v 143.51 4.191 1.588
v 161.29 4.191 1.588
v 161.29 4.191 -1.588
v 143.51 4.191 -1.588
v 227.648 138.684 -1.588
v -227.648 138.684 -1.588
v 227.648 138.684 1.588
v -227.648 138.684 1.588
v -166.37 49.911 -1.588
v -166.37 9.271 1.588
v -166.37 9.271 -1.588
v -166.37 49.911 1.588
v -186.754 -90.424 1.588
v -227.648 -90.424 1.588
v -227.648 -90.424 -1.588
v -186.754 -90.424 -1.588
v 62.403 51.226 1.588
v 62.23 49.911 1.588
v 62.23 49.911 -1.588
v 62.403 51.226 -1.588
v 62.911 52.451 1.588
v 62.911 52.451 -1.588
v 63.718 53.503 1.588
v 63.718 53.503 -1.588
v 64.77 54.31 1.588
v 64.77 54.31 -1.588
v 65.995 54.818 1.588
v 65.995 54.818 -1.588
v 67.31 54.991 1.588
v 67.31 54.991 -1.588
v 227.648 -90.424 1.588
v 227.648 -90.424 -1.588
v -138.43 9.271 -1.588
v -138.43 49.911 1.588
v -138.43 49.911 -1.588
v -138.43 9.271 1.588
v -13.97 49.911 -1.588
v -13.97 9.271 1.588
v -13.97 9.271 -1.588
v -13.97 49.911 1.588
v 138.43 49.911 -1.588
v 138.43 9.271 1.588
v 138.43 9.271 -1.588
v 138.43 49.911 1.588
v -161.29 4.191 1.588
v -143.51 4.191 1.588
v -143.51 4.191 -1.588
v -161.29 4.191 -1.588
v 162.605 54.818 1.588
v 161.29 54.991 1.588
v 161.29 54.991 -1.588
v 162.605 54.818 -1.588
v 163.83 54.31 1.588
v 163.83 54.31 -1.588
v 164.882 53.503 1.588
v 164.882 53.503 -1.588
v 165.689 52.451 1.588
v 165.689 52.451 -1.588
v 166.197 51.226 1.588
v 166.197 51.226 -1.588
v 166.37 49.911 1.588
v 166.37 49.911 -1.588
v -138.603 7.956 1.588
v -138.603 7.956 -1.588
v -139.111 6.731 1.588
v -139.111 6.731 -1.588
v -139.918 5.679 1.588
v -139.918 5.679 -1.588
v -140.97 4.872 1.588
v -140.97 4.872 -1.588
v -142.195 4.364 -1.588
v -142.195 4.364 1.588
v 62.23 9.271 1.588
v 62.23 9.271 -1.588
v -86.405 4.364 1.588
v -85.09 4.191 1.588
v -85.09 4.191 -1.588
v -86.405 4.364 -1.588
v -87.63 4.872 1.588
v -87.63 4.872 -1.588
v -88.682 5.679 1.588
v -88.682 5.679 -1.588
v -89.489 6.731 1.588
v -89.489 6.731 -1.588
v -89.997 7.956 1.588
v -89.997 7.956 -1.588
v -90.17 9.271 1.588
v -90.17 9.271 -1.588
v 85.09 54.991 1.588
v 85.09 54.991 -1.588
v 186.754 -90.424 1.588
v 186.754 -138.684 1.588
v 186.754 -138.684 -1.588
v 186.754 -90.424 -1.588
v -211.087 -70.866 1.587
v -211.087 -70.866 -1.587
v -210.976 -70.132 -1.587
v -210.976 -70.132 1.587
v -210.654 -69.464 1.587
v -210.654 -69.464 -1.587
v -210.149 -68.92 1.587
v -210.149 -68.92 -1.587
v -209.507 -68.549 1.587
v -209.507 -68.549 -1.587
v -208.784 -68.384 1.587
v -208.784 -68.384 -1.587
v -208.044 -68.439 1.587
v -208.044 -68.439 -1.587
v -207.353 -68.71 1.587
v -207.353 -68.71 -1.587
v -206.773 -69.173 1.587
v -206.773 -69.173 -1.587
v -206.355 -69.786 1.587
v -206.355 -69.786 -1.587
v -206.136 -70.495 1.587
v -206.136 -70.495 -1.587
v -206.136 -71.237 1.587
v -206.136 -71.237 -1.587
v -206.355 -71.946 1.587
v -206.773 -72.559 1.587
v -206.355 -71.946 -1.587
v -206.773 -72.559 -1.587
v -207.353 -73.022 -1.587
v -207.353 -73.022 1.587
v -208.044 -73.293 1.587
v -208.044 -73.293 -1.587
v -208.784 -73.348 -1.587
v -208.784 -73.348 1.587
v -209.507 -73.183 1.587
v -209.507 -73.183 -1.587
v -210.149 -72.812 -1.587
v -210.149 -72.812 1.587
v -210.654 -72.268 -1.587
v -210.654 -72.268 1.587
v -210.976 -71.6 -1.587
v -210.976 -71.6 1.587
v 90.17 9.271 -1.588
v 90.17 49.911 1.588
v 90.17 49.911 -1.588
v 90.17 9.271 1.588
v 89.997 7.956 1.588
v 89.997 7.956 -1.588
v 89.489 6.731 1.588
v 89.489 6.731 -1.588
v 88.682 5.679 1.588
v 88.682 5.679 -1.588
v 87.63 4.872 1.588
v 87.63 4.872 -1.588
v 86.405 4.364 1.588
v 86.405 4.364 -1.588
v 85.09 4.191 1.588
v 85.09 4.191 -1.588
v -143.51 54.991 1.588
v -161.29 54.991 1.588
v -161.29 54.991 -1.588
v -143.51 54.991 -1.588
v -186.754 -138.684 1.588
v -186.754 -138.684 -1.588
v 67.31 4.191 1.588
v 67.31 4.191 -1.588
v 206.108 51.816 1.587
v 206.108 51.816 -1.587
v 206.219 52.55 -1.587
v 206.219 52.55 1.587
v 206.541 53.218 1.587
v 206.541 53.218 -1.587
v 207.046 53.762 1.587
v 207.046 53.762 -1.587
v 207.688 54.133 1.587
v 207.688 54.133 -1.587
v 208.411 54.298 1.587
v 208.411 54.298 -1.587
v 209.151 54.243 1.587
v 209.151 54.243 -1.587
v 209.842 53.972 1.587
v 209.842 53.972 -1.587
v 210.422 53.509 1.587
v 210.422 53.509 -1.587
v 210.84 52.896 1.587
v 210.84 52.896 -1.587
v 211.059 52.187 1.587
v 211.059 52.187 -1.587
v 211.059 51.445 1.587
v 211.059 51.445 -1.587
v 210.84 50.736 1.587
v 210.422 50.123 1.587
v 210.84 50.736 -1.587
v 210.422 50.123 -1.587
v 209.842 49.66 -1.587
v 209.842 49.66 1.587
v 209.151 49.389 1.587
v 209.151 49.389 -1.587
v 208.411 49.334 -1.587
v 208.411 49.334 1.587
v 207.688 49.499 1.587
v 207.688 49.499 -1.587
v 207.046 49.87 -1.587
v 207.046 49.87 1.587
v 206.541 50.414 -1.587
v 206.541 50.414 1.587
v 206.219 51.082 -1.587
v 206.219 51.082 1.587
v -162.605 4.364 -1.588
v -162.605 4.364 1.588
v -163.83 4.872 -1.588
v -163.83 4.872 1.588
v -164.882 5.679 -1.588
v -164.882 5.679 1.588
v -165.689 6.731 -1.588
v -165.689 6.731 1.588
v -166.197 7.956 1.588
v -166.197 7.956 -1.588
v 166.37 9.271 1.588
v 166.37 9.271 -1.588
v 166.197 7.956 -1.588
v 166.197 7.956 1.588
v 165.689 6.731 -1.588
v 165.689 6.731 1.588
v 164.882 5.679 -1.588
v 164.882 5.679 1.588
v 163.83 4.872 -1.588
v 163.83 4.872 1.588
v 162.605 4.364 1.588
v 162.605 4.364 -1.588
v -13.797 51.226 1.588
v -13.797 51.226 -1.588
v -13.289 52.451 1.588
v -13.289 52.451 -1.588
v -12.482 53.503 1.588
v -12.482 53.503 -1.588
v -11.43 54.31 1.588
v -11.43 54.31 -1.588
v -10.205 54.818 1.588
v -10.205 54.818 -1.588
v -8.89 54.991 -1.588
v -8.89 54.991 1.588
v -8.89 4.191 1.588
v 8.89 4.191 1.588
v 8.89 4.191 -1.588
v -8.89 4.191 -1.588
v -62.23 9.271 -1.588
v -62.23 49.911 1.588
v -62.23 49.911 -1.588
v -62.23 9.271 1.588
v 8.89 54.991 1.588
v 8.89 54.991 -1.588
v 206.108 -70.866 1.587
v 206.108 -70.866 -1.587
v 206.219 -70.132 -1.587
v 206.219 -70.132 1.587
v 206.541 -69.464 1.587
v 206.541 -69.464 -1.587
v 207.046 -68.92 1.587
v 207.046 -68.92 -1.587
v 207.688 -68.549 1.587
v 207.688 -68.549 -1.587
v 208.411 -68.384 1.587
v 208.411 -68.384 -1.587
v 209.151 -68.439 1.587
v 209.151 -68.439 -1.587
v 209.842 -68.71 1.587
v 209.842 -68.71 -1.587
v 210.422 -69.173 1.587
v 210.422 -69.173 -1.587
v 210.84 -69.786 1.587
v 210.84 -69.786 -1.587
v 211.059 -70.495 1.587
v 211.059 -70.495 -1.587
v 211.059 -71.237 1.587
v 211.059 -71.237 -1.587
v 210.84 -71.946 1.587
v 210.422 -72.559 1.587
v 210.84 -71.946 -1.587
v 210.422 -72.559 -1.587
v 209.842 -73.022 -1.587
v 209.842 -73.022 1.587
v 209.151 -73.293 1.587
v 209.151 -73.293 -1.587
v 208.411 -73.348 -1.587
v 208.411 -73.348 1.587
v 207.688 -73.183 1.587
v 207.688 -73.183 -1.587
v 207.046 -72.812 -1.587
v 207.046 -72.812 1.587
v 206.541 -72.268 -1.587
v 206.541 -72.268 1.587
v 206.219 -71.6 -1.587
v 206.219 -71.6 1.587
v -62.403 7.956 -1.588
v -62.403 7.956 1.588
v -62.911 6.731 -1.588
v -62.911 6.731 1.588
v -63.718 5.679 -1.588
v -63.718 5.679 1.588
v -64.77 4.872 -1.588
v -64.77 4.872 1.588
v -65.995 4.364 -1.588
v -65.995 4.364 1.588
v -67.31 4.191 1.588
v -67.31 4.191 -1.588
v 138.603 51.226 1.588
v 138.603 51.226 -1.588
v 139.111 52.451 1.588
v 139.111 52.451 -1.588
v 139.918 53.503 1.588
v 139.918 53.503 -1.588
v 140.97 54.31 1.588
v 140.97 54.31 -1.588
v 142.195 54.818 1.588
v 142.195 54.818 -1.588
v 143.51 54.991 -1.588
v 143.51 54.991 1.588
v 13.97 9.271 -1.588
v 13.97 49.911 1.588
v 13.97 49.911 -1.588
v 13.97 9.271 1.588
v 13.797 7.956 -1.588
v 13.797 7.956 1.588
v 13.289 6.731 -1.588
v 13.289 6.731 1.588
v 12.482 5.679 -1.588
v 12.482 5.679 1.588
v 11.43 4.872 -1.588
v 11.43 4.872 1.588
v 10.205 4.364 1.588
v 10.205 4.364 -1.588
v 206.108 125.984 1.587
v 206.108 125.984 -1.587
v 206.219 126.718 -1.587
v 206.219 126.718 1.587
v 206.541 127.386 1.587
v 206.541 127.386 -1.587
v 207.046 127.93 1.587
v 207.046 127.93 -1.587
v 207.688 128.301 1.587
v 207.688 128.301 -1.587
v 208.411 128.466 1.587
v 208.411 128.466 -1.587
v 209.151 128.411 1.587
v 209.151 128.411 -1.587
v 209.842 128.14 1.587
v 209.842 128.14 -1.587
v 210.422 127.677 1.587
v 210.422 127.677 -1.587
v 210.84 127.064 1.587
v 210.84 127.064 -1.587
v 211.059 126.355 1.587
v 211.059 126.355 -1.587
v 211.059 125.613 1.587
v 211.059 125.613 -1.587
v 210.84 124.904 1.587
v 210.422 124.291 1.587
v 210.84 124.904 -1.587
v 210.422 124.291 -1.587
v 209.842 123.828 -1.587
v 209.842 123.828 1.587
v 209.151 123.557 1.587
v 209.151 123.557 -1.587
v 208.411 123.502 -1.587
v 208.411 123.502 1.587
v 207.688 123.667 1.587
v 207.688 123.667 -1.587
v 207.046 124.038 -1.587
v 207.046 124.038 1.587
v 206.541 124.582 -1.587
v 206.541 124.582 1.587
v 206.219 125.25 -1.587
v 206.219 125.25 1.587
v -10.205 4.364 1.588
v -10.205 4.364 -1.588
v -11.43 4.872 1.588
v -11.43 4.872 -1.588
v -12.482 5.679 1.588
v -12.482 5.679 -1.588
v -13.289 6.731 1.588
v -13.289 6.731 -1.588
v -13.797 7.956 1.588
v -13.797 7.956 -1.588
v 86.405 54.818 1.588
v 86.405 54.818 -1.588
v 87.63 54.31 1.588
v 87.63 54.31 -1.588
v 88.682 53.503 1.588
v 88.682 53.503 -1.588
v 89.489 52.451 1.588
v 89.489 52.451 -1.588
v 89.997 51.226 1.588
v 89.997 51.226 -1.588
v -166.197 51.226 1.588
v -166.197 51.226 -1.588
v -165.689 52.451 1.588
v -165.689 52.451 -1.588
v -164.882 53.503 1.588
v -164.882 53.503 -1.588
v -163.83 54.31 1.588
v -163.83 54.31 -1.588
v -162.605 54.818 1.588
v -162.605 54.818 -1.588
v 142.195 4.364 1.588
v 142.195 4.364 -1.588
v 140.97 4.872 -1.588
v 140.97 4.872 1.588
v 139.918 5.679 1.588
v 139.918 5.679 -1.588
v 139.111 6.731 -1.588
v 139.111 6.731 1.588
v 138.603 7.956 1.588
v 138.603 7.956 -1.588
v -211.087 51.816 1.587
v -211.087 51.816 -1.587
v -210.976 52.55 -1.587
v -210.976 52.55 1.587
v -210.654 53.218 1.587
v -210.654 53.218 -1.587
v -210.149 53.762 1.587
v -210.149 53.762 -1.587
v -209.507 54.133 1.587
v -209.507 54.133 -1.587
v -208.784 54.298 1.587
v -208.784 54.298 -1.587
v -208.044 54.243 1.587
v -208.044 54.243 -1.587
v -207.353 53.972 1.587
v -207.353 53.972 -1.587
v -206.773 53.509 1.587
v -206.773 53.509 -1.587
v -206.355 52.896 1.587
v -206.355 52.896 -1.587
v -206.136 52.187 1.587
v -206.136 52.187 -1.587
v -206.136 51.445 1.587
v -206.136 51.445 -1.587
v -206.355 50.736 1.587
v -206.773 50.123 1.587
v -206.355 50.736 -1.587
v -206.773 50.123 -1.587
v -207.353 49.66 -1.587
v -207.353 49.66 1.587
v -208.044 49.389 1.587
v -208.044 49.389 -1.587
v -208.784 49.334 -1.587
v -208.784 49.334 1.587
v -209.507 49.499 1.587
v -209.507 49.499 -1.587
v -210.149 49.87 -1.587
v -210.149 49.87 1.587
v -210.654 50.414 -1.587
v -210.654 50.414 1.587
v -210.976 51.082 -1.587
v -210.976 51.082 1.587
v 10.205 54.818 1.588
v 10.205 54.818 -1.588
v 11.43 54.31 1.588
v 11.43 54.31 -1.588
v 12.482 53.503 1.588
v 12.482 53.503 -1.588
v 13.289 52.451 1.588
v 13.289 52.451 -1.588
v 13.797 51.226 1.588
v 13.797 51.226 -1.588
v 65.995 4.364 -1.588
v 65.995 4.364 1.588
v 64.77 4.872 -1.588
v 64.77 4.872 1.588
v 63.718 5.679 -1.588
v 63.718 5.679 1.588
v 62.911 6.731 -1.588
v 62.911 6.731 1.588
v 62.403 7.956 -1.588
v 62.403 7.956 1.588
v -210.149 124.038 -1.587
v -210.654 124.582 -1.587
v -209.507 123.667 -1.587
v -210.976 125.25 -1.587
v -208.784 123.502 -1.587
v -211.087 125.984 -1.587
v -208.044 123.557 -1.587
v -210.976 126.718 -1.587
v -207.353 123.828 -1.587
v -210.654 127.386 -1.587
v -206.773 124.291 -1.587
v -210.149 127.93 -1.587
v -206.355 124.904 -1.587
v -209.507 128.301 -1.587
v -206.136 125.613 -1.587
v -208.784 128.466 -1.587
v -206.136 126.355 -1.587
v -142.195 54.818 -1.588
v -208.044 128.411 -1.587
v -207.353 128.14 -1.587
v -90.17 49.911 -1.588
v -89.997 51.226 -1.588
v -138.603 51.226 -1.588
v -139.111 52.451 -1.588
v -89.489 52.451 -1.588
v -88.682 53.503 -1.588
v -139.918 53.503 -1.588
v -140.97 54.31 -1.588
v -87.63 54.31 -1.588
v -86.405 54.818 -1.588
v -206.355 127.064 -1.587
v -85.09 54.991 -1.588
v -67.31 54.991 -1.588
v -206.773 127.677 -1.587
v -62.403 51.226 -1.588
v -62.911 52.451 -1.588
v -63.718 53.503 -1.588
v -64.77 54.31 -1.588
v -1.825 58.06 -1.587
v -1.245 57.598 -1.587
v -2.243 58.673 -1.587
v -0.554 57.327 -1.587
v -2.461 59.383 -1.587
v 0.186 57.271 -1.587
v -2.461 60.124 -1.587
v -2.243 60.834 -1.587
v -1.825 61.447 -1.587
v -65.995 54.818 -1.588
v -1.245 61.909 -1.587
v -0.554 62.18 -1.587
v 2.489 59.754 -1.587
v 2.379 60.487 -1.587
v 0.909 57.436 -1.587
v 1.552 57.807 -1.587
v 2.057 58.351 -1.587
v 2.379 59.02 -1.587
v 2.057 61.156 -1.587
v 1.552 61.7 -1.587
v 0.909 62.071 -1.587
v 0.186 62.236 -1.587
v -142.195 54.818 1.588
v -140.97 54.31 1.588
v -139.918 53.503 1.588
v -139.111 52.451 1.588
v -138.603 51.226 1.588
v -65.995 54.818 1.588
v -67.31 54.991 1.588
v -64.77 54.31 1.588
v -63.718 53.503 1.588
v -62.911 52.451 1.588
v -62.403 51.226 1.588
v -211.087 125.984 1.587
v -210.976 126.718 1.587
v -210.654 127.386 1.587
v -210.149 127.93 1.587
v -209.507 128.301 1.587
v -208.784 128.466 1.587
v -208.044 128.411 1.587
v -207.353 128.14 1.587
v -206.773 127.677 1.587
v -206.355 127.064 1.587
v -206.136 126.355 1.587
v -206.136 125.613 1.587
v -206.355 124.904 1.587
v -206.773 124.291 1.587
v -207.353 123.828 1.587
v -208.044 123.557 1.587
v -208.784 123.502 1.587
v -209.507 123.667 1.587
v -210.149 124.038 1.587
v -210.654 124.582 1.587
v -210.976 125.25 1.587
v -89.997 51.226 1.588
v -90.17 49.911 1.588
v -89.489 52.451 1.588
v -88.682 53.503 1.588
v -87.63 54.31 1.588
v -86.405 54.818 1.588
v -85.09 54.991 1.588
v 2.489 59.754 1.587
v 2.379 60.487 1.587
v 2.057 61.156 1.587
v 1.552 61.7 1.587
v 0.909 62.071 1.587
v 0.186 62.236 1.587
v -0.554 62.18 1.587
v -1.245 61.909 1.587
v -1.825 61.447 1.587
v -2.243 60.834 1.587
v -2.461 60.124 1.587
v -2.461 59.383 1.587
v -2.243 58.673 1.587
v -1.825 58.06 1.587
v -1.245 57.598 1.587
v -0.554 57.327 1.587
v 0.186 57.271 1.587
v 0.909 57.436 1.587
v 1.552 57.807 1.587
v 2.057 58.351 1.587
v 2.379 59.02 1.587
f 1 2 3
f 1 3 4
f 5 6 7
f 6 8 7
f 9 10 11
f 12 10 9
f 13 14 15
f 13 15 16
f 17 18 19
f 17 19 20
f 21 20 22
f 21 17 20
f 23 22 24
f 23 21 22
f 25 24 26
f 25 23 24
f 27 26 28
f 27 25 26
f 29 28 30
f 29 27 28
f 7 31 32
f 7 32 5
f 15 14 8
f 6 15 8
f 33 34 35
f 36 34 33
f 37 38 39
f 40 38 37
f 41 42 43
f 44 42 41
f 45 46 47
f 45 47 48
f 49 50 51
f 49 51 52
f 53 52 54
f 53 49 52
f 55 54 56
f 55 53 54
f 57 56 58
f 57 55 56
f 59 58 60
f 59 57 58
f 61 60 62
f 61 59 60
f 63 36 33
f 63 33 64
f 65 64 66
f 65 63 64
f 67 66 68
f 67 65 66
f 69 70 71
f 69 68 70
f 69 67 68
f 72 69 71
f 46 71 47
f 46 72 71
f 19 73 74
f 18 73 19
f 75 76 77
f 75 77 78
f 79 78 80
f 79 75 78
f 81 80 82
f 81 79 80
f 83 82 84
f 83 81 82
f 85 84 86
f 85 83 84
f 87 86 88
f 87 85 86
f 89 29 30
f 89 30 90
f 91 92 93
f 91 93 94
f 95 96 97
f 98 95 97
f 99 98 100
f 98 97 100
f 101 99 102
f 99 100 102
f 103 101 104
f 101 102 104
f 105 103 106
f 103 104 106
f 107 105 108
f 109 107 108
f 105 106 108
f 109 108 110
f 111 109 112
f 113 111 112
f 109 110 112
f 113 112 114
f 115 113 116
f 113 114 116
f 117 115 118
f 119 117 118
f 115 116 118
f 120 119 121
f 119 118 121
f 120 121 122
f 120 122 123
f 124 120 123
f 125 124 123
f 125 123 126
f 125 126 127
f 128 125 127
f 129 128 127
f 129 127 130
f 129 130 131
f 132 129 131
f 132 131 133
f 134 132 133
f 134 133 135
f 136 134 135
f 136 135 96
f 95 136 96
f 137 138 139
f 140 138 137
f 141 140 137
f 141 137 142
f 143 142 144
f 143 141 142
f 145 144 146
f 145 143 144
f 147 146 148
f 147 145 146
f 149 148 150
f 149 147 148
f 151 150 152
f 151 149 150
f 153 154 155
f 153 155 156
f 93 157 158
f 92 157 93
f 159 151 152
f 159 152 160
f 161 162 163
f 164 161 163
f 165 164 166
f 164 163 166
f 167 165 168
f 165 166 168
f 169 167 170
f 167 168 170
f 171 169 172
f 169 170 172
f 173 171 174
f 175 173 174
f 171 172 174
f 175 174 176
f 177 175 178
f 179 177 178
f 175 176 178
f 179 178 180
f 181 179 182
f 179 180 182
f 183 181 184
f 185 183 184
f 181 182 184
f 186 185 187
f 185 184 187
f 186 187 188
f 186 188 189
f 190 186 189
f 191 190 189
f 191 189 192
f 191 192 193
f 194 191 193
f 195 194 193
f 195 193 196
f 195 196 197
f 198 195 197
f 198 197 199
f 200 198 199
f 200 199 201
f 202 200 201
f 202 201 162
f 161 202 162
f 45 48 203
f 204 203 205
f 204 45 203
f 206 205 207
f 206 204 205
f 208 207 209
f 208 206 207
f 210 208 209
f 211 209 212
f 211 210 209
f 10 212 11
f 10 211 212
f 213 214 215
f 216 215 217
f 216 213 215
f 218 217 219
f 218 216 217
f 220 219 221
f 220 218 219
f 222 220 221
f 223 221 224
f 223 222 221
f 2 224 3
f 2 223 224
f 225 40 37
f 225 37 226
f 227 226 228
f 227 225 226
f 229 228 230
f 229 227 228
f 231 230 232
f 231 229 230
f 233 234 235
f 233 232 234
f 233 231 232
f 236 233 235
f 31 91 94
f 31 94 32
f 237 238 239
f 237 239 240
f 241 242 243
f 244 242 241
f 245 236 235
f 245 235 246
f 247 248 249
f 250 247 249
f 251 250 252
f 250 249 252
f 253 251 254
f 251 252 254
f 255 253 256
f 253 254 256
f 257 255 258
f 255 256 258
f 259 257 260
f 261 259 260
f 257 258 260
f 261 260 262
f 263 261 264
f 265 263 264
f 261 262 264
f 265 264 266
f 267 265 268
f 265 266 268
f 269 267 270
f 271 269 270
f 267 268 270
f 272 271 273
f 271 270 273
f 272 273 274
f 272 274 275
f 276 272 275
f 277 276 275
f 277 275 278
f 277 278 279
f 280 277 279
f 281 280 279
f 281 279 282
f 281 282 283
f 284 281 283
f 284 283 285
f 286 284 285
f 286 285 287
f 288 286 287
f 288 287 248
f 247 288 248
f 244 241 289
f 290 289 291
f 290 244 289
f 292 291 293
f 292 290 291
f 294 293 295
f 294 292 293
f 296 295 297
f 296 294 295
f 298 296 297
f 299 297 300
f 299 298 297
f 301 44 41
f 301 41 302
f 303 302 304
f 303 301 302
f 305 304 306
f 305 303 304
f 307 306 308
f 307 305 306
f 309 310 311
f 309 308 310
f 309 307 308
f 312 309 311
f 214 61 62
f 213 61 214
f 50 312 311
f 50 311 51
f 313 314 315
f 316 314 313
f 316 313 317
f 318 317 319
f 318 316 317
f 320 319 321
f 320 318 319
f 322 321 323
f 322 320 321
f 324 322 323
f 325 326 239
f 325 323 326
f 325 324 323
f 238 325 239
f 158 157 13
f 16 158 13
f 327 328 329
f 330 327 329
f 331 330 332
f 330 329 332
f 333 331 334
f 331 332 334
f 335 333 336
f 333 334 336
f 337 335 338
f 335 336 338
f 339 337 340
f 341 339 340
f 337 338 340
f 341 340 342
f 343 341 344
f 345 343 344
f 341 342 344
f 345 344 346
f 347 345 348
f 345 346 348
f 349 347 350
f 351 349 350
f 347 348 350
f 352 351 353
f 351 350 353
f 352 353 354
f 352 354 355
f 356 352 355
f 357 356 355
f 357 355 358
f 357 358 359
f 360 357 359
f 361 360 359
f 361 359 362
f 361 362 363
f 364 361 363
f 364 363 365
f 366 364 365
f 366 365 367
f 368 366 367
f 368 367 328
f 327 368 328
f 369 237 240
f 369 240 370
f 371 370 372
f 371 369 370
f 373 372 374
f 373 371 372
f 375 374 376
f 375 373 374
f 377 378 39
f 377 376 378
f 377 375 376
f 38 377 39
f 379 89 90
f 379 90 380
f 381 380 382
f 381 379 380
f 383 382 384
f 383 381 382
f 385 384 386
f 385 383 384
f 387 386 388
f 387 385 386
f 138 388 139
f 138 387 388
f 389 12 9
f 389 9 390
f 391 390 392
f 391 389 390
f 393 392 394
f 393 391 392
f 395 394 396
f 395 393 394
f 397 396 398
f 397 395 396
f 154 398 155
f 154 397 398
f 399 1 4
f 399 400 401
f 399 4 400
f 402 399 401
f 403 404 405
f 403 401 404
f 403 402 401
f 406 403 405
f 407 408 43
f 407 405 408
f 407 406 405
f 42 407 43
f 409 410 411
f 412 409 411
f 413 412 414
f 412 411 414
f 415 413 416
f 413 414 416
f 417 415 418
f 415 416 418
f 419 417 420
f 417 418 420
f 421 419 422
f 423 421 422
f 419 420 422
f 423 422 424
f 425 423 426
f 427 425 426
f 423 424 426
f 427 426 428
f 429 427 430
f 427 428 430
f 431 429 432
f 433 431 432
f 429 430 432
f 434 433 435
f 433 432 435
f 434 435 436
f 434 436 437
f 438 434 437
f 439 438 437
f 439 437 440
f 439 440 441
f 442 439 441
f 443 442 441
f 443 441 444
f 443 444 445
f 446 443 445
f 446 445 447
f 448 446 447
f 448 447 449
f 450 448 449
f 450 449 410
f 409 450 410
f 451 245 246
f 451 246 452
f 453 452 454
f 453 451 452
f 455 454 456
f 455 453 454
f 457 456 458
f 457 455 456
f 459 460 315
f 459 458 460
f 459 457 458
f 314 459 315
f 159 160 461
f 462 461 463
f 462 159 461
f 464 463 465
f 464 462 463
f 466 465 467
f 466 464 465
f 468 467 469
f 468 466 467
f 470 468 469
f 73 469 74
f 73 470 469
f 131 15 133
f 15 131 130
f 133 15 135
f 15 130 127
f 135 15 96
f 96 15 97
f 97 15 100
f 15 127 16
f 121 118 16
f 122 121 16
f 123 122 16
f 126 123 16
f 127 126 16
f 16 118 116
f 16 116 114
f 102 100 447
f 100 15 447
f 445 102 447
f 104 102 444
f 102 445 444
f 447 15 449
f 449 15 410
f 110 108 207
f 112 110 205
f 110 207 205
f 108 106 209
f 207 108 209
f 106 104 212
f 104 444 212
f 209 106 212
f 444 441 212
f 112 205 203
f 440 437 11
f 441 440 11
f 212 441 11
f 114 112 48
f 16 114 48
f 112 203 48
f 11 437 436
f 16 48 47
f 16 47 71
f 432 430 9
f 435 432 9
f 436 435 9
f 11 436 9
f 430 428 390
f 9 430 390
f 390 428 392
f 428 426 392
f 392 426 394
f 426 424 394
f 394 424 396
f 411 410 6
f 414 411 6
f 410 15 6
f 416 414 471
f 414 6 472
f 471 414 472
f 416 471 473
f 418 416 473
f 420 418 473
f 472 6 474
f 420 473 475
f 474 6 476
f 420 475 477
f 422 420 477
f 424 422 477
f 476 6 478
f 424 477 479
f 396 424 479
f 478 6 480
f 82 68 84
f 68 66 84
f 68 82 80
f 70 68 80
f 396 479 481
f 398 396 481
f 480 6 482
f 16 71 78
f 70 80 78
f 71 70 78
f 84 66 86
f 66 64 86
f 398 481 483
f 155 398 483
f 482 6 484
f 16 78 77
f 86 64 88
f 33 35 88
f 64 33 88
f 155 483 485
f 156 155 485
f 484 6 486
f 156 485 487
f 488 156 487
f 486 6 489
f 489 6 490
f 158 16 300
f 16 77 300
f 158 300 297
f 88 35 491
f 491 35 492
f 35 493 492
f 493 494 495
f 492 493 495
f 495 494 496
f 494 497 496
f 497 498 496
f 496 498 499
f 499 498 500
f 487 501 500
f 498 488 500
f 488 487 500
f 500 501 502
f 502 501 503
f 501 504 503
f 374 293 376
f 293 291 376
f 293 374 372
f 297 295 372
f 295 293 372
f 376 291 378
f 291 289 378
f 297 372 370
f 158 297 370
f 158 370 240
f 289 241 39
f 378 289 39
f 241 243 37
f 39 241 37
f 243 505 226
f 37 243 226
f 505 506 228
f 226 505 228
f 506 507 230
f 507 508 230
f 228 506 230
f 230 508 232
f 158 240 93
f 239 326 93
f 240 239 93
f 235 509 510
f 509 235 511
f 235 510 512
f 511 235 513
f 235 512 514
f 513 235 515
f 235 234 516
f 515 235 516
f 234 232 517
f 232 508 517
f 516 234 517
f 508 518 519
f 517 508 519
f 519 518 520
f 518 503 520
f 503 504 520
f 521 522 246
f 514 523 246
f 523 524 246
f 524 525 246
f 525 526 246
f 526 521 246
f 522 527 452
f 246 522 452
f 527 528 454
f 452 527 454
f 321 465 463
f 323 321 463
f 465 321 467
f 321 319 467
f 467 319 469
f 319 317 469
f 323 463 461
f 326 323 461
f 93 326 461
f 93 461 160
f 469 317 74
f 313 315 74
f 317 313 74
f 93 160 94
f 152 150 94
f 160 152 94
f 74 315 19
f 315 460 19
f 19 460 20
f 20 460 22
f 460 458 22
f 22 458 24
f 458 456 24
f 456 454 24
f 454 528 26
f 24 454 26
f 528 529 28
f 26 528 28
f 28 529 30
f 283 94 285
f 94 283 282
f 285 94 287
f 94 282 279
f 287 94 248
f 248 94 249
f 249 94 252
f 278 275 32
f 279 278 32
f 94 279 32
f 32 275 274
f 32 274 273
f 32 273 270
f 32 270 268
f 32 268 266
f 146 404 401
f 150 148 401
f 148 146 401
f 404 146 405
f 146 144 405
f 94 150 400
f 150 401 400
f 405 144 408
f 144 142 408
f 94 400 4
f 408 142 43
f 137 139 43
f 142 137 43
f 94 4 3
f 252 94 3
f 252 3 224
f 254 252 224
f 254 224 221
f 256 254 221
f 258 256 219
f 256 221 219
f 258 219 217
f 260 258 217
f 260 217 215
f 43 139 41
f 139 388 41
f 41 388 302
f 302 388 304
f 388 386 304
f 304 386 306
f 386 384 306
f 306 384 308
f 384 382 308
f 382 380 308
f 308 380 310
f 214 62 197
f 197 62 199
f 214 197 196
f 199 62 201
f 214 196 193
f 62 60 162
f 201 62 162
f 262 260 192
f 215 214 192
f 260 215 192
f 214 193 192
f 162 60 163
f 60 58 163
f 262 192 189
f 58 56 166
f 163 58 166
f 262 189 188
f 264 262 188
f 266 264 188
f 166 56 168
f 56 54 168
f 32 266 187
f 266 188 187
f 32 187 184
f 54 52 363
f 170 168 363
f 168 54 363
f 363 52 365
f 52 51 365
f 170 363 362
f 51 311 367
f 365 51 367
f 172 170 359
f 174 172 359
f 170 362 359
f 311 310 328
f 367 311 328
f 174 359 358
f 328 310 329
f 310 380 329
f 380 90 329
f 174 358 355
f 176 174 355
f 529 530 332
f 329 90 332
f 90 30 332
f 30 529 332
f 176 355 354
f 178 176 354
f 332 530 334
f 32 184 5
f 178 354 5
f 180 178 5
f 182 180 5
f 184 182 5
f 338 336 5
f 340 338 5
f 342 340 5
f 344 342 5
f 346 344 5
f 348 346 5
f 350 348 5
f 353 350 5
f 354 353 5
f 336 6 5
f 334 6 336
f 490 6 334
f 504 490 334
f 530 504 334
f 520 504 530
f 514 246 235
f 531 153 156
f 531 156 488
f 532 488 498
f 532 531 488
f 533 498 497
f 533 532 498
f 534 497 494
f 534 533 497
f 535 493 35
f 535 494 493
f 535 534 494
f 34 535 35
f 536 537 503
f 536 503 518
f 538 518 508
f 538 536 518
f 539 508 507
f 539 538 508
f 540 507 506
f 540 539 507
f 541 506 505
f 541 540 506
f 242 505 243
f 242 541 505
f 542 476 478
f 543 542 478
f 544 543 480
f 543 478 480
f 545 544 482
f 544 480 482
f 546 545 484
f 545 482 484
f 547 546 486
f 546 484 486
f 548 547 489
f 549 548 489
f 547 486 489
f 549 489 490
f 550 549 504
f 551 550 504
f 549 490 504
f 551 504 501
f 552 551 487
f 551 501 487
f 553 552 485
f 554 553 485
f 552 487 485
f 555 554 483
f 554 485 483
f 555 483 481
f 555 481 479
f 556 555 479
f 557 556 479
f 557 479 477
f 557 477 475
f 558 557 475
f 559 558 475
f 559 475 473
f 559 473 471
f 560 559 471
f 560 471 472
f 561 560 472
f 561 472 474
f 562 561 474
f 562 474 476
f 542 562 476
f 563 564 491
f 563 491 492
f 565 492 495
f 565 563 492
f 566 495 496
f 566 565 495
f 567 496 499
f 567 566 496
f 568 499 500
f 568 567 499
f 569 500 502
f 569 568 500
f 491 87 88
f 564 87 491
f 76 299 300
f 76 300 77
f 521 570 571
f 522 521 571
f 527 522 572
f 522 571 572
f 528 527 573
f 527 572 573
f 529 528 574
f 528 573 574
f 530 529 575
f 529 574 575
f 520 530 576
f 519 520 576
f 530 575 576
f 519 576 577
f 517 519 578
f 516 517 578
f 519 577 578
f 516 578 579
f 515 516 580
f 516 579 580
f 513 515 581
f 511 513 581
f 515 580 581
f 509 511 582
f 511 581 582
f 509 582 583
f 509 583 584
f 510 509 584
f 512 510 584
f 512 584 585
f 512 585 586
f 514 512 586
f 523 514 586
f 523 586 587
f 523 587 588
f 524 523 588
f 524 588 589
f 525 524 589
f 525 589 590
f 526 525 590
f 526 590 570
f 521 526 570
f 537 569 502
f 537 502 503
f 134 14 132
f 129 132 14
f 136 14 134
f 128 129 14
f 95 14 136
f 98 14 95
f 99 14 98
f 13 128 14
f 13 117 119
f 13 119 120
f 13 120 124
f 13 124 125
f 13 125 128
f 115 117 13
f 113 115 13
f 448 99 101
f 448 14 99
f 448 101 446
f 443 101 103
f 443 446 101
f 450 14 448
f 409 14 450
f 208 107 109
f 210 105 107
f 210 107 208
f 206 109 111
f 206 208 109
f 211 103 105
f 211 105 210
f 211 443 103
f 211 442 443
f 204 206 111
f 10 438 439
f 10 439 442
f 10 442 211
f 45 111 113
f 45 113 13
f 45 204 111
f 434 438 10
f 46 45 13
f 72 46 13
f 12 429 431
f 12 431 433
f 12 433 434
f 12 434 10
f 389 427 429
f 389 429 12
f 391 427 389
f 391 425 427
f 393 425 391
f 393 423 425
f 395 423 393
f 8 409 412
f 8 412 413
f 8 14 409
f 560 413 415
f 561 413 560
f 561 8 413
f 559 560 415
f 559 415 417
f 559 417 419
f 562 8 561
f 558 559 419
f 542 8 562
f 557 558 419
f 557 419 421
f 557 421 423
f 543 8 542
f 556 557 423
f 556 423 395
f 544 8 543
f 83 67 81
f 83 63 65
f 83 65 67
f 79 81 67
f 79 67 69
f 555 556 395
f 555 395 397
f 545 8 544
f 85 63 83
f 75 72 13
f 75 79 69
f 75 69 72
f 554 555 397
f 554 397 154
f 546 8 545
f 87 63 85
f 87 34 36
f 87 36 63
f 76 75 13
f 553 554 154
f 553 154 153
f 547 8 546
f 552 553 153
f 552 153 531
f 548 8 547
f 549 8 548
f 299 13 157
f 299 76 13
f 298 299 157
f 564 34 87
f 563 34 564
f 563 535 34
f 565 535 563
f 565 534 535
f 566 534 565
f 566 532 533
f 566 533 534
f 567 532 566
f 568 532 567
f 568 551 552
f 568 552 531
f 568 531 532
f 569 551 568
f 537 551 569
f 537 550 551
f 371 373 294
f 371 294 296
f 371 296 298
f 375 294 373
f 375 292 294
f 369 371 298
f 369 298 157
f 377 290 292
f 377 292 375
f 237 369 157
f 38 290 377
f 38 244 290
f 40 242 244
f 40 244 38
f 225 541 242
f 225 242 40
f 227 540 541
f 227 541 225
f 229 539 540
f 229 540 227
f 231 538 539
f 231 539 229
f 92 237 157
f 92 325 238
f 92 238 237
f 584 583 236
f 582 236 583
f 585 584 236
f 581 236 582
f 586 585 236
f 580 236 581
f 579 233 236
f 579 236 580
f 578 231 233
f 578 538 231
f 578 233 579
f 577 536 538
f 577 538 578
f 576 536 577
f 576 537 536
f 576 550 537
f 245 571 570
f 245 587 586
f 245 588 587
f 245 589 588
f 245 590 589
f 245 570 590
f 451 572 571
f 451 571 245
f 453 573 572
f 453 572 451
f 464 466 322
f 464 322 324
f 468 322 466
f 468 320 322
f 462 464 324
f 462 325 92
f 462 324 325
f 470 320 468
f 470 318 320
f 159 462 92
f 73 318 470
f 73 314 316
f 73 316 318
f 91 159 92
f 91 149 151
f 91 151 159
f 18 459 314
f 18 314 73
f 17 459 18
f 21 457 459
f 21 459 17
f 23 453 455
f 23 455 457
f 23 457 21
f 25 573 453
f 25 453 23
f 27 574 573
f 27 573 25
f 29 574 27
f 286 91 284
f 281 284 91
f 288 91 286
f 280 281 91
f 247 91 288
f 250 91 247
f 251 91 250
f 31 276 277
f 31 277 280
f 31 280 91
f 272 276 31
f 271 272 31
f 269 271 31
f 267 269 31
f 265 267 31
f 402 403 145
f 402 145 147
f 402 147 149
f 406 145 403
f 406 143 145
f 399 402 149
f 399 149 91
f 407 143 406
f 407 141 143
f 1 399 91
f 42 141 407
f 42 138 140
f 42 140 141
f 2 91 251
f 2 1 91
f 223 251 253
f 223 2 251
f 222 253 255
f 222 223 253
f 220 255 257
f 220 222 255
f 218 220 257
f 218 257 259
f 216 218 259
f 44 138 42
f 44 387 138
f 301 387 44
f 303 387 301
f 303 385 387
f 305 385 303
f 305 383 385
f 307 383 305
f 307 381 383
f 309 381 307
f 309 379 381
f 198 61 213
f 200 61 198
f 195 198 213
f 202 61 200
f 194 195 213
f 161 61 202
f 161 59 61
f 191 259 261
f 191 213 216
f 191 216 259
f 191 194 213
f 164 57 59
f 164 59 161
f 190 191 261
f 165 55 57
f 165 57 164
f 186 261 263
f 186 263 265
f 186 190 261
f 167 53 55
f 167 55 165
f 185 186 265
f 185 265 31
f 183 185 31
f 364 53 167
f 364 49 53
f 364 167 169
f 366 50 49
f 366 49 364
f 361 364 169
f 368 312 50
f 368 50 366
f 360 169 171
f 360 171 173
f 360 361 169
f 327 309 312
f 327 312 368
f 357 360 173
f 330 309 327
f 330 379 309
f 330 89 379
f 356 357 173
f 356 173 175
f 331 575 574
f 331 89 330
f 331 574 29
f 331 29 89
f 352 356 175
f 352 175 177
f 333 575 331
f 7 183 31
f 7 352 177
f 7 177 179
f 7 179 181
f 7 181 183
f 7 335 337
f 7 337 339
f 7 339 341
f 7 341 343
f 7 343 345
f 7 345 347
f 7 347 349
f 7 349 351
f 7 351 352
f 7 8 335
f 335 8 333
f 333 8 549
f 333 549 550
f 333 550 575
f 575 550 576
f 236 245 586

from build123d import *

# Parameters (mm, degrees)
SKETCH3_W              = 455.295
SKETCH3_H              = 277.368
BOSS_EXTRUDE1_DEPTH    = 1.5875
CUT_EXTRUDE1_DEPTH     = 25.4
SKETCH8_W              = 40.894
SKETCH8_H              = 48.26
CUT_EXTRUDE2_DEPTH     = 25.4
F_10_CLEARANCE_HOLE1_D = 4.9784
F_10_CLEARANCE_HOLE2_D = 4.9784


with BuildPart() as part:
    # Sketch3 → Boss-Extrude1 (new, symmetric)
    with BuildSketch(Plane.XY):
        Rectangle(SKETCH3_W, SKETCH3_H)
    extrude(amount=BOSS_EXTRUDE1_DEPTH, both=True)

    # Sketch4 → Cut-Extrude1 (cut)
    with BuildSketch(Plane.XY.offset(1.5875)):
        with BuildLine():
            Line((-161.29, 54.991001016), (-143.51, 54.991001016))
            ThreePointArc((-143.51, 54.991001016), (-139.917897552, 53.503103464), (-138.43, 49.911001016))
            Line((-138.43, 49.911001016), (-138.43, 9.271001016))
            ThreePointArc((-138.43, 9.271001016), (-139.917897552, 5.678898568), (-143.51, 4.191001016))
            Line((-143.51, 4.191001016), (-161.29, 4.191001016))
            ThreePointArc((-161.29, 4.191001016), (-164.882102448, 5.678898568), (-166.37, 9.271001016))
            Line((-166.37, 9.271001016), (-166.37, 49.911001016))
            ThreePointArc((-166.37, 49.911001016), (-164.882102448, 53.503103464), (-161.29, 54.991001016))
        make_face()
        with BuildLine():
            Line((-8.89, 54.991001016), (8.89, 54.991001016))
            ThreePointArc((8.89, 54.991001016), (12.482102448, 53.503103464), (13.97, 49.911001016))
            Line((13.97, 49.911001016), (13.97, 9.271001016))
            ThreePointArc((13.97, 9.271001016), (12.482102448, 5.678898568), (8.89, 4.191001016))
            Line((8.89, 4.191001016), (-8.89, 4.191001016))
            ThreePointArc((-8.89, 4.191001016), (-12.482102448, 5.678898568), (-13.97, 9.271001016))
            Line((-13.97, 9.271001016), (-13.97, 49.911001016))
            ThreePointArc((-13.97, 49.911001016), (-12.482102448, 53.503103464), (-8.89, 54.991001016))
        make_face()
        with BuildLine():
            Line((67.31, 54.991001016), (85.09, 54.991001016))
            ThreePointArc((85.09, 54.991001016), (88.682102448, 53.503103464), (90.17, 49.911001016))
            Line((90.17, 49.911001016), (90.17, 9.271001016))
            ThreePointArc((90.17, 9.271001016), (88.682102448, 5.678898568), (85.09, 4.191001016))
            Line((85.09, 4.191001016), (67.31, 4.191001016))
            ThreePointArc((67.31, 4.191001016), (63.717897552, 5.678898568), (62.23, 9.271001016))
            Line((62.23, 9.271001016), (62.23, 49.911001016))
            ThreePointArc((62.23, 49.911001016), (63.717897552, 53.503103464), (67.31, 54.991001016))
        make_face()
        with BuildLine():
            Line((143.51, 54.991001016), (161.29, 54.991001016))
            ThreePointArc((161.29, 54.991001016), (164.882102448, 53.503103464), (166.37, 49.911001016))
            Line((166.37, 49.911001016), (166.37, 9.271001016))
            ThreePointArc((166.37, 9.271001016), (164.882102448, 5.678898568), (161.29, 4.191001016))
            Line((161.29, 4.191001016), (143.51, 4.191001016))
            ThreePointArc((143.51, 4.191001016), (139.917897552, 5.678898568), (138.43, 9.271001016))
            Line((138.43, 9.271001016), (138.43, 49.911001016))
            ThreePointArc((138.43, 49.911001016), (139.917897552, 53.503103464), (143.51, 54.991001016))
        make_face()
        with BuildLine():
            Line((-85.09, 54.991001016), (-67.31, 54.991001016))
            ThreePointArc((-67.31, 54.991001016), (-63.717897552, 53.503103464), (-62.23, 49.911001016))
            Line((-62.23, 49.911001016), (-62.23, 9.271001016))
            ThreePointArc((-62.23, 9.271001016), (-63.717897552, 5.678898568), (-67.31, 4.191001016))
            Line((-67.31, 4.191001016), (-85.09, 4.191001016))
            ThreePointArc((-85.09, 4.191001016), (-88.682102448, 5.678898568), (-90.17, 9.271001016))
            Line((-90.17, 9.271001016), (-90.17, 49.911001016))
            ThreePointArc((-90.17, 49.911001016), (-88.682102448, 53.503103464), (-85.09, 54.991001016))
        make_face()
    extrude(amount=-CUT_EXTRUDE1_DEPTH, mode=Mode.SUBTRACT)

    # Sketch8 → Cut-Extrude2 (cut)
    with BuildSketch(Plane.XY.offset(1.5875)):
        with Locations((-207.2005, -114.554)):
            Rectangle(SKETCH8_W, SKETCH8_H)
        with Locations((207.2005, -114.554)):
            Rectangle(SKETCH8_W, SKETCH8_H)
    extrude(amount=-CUT_EXTRUDE2_DEPTH, mode=Mode.SUBTRACT)

    # #10 Clearance Hole1 (through all)
    with Locations(Plane.XY.offset(1.5875)):
        with Locations((208.5975, 125.984), (208.5975, 51.816), (208.5975, -70.866), (-208.5975, -70.866), (-208.5975, 51.816), (-208.5975, 125.984)):
            Hole(F_10_CLEARANCE_HOLE1_D / 2)

    # #10 Clearance Hole2 (through all)
    with Locations(Plane(origin=(0, 0, -1.5875), x_dir=(-1, 0, 0), z_dir=(0, 0, -1))):
        with Locations((0, 59.7535)):
            Hole(F_10_CLEARANCE_HOLE2_D / 2)


solid = part.part
